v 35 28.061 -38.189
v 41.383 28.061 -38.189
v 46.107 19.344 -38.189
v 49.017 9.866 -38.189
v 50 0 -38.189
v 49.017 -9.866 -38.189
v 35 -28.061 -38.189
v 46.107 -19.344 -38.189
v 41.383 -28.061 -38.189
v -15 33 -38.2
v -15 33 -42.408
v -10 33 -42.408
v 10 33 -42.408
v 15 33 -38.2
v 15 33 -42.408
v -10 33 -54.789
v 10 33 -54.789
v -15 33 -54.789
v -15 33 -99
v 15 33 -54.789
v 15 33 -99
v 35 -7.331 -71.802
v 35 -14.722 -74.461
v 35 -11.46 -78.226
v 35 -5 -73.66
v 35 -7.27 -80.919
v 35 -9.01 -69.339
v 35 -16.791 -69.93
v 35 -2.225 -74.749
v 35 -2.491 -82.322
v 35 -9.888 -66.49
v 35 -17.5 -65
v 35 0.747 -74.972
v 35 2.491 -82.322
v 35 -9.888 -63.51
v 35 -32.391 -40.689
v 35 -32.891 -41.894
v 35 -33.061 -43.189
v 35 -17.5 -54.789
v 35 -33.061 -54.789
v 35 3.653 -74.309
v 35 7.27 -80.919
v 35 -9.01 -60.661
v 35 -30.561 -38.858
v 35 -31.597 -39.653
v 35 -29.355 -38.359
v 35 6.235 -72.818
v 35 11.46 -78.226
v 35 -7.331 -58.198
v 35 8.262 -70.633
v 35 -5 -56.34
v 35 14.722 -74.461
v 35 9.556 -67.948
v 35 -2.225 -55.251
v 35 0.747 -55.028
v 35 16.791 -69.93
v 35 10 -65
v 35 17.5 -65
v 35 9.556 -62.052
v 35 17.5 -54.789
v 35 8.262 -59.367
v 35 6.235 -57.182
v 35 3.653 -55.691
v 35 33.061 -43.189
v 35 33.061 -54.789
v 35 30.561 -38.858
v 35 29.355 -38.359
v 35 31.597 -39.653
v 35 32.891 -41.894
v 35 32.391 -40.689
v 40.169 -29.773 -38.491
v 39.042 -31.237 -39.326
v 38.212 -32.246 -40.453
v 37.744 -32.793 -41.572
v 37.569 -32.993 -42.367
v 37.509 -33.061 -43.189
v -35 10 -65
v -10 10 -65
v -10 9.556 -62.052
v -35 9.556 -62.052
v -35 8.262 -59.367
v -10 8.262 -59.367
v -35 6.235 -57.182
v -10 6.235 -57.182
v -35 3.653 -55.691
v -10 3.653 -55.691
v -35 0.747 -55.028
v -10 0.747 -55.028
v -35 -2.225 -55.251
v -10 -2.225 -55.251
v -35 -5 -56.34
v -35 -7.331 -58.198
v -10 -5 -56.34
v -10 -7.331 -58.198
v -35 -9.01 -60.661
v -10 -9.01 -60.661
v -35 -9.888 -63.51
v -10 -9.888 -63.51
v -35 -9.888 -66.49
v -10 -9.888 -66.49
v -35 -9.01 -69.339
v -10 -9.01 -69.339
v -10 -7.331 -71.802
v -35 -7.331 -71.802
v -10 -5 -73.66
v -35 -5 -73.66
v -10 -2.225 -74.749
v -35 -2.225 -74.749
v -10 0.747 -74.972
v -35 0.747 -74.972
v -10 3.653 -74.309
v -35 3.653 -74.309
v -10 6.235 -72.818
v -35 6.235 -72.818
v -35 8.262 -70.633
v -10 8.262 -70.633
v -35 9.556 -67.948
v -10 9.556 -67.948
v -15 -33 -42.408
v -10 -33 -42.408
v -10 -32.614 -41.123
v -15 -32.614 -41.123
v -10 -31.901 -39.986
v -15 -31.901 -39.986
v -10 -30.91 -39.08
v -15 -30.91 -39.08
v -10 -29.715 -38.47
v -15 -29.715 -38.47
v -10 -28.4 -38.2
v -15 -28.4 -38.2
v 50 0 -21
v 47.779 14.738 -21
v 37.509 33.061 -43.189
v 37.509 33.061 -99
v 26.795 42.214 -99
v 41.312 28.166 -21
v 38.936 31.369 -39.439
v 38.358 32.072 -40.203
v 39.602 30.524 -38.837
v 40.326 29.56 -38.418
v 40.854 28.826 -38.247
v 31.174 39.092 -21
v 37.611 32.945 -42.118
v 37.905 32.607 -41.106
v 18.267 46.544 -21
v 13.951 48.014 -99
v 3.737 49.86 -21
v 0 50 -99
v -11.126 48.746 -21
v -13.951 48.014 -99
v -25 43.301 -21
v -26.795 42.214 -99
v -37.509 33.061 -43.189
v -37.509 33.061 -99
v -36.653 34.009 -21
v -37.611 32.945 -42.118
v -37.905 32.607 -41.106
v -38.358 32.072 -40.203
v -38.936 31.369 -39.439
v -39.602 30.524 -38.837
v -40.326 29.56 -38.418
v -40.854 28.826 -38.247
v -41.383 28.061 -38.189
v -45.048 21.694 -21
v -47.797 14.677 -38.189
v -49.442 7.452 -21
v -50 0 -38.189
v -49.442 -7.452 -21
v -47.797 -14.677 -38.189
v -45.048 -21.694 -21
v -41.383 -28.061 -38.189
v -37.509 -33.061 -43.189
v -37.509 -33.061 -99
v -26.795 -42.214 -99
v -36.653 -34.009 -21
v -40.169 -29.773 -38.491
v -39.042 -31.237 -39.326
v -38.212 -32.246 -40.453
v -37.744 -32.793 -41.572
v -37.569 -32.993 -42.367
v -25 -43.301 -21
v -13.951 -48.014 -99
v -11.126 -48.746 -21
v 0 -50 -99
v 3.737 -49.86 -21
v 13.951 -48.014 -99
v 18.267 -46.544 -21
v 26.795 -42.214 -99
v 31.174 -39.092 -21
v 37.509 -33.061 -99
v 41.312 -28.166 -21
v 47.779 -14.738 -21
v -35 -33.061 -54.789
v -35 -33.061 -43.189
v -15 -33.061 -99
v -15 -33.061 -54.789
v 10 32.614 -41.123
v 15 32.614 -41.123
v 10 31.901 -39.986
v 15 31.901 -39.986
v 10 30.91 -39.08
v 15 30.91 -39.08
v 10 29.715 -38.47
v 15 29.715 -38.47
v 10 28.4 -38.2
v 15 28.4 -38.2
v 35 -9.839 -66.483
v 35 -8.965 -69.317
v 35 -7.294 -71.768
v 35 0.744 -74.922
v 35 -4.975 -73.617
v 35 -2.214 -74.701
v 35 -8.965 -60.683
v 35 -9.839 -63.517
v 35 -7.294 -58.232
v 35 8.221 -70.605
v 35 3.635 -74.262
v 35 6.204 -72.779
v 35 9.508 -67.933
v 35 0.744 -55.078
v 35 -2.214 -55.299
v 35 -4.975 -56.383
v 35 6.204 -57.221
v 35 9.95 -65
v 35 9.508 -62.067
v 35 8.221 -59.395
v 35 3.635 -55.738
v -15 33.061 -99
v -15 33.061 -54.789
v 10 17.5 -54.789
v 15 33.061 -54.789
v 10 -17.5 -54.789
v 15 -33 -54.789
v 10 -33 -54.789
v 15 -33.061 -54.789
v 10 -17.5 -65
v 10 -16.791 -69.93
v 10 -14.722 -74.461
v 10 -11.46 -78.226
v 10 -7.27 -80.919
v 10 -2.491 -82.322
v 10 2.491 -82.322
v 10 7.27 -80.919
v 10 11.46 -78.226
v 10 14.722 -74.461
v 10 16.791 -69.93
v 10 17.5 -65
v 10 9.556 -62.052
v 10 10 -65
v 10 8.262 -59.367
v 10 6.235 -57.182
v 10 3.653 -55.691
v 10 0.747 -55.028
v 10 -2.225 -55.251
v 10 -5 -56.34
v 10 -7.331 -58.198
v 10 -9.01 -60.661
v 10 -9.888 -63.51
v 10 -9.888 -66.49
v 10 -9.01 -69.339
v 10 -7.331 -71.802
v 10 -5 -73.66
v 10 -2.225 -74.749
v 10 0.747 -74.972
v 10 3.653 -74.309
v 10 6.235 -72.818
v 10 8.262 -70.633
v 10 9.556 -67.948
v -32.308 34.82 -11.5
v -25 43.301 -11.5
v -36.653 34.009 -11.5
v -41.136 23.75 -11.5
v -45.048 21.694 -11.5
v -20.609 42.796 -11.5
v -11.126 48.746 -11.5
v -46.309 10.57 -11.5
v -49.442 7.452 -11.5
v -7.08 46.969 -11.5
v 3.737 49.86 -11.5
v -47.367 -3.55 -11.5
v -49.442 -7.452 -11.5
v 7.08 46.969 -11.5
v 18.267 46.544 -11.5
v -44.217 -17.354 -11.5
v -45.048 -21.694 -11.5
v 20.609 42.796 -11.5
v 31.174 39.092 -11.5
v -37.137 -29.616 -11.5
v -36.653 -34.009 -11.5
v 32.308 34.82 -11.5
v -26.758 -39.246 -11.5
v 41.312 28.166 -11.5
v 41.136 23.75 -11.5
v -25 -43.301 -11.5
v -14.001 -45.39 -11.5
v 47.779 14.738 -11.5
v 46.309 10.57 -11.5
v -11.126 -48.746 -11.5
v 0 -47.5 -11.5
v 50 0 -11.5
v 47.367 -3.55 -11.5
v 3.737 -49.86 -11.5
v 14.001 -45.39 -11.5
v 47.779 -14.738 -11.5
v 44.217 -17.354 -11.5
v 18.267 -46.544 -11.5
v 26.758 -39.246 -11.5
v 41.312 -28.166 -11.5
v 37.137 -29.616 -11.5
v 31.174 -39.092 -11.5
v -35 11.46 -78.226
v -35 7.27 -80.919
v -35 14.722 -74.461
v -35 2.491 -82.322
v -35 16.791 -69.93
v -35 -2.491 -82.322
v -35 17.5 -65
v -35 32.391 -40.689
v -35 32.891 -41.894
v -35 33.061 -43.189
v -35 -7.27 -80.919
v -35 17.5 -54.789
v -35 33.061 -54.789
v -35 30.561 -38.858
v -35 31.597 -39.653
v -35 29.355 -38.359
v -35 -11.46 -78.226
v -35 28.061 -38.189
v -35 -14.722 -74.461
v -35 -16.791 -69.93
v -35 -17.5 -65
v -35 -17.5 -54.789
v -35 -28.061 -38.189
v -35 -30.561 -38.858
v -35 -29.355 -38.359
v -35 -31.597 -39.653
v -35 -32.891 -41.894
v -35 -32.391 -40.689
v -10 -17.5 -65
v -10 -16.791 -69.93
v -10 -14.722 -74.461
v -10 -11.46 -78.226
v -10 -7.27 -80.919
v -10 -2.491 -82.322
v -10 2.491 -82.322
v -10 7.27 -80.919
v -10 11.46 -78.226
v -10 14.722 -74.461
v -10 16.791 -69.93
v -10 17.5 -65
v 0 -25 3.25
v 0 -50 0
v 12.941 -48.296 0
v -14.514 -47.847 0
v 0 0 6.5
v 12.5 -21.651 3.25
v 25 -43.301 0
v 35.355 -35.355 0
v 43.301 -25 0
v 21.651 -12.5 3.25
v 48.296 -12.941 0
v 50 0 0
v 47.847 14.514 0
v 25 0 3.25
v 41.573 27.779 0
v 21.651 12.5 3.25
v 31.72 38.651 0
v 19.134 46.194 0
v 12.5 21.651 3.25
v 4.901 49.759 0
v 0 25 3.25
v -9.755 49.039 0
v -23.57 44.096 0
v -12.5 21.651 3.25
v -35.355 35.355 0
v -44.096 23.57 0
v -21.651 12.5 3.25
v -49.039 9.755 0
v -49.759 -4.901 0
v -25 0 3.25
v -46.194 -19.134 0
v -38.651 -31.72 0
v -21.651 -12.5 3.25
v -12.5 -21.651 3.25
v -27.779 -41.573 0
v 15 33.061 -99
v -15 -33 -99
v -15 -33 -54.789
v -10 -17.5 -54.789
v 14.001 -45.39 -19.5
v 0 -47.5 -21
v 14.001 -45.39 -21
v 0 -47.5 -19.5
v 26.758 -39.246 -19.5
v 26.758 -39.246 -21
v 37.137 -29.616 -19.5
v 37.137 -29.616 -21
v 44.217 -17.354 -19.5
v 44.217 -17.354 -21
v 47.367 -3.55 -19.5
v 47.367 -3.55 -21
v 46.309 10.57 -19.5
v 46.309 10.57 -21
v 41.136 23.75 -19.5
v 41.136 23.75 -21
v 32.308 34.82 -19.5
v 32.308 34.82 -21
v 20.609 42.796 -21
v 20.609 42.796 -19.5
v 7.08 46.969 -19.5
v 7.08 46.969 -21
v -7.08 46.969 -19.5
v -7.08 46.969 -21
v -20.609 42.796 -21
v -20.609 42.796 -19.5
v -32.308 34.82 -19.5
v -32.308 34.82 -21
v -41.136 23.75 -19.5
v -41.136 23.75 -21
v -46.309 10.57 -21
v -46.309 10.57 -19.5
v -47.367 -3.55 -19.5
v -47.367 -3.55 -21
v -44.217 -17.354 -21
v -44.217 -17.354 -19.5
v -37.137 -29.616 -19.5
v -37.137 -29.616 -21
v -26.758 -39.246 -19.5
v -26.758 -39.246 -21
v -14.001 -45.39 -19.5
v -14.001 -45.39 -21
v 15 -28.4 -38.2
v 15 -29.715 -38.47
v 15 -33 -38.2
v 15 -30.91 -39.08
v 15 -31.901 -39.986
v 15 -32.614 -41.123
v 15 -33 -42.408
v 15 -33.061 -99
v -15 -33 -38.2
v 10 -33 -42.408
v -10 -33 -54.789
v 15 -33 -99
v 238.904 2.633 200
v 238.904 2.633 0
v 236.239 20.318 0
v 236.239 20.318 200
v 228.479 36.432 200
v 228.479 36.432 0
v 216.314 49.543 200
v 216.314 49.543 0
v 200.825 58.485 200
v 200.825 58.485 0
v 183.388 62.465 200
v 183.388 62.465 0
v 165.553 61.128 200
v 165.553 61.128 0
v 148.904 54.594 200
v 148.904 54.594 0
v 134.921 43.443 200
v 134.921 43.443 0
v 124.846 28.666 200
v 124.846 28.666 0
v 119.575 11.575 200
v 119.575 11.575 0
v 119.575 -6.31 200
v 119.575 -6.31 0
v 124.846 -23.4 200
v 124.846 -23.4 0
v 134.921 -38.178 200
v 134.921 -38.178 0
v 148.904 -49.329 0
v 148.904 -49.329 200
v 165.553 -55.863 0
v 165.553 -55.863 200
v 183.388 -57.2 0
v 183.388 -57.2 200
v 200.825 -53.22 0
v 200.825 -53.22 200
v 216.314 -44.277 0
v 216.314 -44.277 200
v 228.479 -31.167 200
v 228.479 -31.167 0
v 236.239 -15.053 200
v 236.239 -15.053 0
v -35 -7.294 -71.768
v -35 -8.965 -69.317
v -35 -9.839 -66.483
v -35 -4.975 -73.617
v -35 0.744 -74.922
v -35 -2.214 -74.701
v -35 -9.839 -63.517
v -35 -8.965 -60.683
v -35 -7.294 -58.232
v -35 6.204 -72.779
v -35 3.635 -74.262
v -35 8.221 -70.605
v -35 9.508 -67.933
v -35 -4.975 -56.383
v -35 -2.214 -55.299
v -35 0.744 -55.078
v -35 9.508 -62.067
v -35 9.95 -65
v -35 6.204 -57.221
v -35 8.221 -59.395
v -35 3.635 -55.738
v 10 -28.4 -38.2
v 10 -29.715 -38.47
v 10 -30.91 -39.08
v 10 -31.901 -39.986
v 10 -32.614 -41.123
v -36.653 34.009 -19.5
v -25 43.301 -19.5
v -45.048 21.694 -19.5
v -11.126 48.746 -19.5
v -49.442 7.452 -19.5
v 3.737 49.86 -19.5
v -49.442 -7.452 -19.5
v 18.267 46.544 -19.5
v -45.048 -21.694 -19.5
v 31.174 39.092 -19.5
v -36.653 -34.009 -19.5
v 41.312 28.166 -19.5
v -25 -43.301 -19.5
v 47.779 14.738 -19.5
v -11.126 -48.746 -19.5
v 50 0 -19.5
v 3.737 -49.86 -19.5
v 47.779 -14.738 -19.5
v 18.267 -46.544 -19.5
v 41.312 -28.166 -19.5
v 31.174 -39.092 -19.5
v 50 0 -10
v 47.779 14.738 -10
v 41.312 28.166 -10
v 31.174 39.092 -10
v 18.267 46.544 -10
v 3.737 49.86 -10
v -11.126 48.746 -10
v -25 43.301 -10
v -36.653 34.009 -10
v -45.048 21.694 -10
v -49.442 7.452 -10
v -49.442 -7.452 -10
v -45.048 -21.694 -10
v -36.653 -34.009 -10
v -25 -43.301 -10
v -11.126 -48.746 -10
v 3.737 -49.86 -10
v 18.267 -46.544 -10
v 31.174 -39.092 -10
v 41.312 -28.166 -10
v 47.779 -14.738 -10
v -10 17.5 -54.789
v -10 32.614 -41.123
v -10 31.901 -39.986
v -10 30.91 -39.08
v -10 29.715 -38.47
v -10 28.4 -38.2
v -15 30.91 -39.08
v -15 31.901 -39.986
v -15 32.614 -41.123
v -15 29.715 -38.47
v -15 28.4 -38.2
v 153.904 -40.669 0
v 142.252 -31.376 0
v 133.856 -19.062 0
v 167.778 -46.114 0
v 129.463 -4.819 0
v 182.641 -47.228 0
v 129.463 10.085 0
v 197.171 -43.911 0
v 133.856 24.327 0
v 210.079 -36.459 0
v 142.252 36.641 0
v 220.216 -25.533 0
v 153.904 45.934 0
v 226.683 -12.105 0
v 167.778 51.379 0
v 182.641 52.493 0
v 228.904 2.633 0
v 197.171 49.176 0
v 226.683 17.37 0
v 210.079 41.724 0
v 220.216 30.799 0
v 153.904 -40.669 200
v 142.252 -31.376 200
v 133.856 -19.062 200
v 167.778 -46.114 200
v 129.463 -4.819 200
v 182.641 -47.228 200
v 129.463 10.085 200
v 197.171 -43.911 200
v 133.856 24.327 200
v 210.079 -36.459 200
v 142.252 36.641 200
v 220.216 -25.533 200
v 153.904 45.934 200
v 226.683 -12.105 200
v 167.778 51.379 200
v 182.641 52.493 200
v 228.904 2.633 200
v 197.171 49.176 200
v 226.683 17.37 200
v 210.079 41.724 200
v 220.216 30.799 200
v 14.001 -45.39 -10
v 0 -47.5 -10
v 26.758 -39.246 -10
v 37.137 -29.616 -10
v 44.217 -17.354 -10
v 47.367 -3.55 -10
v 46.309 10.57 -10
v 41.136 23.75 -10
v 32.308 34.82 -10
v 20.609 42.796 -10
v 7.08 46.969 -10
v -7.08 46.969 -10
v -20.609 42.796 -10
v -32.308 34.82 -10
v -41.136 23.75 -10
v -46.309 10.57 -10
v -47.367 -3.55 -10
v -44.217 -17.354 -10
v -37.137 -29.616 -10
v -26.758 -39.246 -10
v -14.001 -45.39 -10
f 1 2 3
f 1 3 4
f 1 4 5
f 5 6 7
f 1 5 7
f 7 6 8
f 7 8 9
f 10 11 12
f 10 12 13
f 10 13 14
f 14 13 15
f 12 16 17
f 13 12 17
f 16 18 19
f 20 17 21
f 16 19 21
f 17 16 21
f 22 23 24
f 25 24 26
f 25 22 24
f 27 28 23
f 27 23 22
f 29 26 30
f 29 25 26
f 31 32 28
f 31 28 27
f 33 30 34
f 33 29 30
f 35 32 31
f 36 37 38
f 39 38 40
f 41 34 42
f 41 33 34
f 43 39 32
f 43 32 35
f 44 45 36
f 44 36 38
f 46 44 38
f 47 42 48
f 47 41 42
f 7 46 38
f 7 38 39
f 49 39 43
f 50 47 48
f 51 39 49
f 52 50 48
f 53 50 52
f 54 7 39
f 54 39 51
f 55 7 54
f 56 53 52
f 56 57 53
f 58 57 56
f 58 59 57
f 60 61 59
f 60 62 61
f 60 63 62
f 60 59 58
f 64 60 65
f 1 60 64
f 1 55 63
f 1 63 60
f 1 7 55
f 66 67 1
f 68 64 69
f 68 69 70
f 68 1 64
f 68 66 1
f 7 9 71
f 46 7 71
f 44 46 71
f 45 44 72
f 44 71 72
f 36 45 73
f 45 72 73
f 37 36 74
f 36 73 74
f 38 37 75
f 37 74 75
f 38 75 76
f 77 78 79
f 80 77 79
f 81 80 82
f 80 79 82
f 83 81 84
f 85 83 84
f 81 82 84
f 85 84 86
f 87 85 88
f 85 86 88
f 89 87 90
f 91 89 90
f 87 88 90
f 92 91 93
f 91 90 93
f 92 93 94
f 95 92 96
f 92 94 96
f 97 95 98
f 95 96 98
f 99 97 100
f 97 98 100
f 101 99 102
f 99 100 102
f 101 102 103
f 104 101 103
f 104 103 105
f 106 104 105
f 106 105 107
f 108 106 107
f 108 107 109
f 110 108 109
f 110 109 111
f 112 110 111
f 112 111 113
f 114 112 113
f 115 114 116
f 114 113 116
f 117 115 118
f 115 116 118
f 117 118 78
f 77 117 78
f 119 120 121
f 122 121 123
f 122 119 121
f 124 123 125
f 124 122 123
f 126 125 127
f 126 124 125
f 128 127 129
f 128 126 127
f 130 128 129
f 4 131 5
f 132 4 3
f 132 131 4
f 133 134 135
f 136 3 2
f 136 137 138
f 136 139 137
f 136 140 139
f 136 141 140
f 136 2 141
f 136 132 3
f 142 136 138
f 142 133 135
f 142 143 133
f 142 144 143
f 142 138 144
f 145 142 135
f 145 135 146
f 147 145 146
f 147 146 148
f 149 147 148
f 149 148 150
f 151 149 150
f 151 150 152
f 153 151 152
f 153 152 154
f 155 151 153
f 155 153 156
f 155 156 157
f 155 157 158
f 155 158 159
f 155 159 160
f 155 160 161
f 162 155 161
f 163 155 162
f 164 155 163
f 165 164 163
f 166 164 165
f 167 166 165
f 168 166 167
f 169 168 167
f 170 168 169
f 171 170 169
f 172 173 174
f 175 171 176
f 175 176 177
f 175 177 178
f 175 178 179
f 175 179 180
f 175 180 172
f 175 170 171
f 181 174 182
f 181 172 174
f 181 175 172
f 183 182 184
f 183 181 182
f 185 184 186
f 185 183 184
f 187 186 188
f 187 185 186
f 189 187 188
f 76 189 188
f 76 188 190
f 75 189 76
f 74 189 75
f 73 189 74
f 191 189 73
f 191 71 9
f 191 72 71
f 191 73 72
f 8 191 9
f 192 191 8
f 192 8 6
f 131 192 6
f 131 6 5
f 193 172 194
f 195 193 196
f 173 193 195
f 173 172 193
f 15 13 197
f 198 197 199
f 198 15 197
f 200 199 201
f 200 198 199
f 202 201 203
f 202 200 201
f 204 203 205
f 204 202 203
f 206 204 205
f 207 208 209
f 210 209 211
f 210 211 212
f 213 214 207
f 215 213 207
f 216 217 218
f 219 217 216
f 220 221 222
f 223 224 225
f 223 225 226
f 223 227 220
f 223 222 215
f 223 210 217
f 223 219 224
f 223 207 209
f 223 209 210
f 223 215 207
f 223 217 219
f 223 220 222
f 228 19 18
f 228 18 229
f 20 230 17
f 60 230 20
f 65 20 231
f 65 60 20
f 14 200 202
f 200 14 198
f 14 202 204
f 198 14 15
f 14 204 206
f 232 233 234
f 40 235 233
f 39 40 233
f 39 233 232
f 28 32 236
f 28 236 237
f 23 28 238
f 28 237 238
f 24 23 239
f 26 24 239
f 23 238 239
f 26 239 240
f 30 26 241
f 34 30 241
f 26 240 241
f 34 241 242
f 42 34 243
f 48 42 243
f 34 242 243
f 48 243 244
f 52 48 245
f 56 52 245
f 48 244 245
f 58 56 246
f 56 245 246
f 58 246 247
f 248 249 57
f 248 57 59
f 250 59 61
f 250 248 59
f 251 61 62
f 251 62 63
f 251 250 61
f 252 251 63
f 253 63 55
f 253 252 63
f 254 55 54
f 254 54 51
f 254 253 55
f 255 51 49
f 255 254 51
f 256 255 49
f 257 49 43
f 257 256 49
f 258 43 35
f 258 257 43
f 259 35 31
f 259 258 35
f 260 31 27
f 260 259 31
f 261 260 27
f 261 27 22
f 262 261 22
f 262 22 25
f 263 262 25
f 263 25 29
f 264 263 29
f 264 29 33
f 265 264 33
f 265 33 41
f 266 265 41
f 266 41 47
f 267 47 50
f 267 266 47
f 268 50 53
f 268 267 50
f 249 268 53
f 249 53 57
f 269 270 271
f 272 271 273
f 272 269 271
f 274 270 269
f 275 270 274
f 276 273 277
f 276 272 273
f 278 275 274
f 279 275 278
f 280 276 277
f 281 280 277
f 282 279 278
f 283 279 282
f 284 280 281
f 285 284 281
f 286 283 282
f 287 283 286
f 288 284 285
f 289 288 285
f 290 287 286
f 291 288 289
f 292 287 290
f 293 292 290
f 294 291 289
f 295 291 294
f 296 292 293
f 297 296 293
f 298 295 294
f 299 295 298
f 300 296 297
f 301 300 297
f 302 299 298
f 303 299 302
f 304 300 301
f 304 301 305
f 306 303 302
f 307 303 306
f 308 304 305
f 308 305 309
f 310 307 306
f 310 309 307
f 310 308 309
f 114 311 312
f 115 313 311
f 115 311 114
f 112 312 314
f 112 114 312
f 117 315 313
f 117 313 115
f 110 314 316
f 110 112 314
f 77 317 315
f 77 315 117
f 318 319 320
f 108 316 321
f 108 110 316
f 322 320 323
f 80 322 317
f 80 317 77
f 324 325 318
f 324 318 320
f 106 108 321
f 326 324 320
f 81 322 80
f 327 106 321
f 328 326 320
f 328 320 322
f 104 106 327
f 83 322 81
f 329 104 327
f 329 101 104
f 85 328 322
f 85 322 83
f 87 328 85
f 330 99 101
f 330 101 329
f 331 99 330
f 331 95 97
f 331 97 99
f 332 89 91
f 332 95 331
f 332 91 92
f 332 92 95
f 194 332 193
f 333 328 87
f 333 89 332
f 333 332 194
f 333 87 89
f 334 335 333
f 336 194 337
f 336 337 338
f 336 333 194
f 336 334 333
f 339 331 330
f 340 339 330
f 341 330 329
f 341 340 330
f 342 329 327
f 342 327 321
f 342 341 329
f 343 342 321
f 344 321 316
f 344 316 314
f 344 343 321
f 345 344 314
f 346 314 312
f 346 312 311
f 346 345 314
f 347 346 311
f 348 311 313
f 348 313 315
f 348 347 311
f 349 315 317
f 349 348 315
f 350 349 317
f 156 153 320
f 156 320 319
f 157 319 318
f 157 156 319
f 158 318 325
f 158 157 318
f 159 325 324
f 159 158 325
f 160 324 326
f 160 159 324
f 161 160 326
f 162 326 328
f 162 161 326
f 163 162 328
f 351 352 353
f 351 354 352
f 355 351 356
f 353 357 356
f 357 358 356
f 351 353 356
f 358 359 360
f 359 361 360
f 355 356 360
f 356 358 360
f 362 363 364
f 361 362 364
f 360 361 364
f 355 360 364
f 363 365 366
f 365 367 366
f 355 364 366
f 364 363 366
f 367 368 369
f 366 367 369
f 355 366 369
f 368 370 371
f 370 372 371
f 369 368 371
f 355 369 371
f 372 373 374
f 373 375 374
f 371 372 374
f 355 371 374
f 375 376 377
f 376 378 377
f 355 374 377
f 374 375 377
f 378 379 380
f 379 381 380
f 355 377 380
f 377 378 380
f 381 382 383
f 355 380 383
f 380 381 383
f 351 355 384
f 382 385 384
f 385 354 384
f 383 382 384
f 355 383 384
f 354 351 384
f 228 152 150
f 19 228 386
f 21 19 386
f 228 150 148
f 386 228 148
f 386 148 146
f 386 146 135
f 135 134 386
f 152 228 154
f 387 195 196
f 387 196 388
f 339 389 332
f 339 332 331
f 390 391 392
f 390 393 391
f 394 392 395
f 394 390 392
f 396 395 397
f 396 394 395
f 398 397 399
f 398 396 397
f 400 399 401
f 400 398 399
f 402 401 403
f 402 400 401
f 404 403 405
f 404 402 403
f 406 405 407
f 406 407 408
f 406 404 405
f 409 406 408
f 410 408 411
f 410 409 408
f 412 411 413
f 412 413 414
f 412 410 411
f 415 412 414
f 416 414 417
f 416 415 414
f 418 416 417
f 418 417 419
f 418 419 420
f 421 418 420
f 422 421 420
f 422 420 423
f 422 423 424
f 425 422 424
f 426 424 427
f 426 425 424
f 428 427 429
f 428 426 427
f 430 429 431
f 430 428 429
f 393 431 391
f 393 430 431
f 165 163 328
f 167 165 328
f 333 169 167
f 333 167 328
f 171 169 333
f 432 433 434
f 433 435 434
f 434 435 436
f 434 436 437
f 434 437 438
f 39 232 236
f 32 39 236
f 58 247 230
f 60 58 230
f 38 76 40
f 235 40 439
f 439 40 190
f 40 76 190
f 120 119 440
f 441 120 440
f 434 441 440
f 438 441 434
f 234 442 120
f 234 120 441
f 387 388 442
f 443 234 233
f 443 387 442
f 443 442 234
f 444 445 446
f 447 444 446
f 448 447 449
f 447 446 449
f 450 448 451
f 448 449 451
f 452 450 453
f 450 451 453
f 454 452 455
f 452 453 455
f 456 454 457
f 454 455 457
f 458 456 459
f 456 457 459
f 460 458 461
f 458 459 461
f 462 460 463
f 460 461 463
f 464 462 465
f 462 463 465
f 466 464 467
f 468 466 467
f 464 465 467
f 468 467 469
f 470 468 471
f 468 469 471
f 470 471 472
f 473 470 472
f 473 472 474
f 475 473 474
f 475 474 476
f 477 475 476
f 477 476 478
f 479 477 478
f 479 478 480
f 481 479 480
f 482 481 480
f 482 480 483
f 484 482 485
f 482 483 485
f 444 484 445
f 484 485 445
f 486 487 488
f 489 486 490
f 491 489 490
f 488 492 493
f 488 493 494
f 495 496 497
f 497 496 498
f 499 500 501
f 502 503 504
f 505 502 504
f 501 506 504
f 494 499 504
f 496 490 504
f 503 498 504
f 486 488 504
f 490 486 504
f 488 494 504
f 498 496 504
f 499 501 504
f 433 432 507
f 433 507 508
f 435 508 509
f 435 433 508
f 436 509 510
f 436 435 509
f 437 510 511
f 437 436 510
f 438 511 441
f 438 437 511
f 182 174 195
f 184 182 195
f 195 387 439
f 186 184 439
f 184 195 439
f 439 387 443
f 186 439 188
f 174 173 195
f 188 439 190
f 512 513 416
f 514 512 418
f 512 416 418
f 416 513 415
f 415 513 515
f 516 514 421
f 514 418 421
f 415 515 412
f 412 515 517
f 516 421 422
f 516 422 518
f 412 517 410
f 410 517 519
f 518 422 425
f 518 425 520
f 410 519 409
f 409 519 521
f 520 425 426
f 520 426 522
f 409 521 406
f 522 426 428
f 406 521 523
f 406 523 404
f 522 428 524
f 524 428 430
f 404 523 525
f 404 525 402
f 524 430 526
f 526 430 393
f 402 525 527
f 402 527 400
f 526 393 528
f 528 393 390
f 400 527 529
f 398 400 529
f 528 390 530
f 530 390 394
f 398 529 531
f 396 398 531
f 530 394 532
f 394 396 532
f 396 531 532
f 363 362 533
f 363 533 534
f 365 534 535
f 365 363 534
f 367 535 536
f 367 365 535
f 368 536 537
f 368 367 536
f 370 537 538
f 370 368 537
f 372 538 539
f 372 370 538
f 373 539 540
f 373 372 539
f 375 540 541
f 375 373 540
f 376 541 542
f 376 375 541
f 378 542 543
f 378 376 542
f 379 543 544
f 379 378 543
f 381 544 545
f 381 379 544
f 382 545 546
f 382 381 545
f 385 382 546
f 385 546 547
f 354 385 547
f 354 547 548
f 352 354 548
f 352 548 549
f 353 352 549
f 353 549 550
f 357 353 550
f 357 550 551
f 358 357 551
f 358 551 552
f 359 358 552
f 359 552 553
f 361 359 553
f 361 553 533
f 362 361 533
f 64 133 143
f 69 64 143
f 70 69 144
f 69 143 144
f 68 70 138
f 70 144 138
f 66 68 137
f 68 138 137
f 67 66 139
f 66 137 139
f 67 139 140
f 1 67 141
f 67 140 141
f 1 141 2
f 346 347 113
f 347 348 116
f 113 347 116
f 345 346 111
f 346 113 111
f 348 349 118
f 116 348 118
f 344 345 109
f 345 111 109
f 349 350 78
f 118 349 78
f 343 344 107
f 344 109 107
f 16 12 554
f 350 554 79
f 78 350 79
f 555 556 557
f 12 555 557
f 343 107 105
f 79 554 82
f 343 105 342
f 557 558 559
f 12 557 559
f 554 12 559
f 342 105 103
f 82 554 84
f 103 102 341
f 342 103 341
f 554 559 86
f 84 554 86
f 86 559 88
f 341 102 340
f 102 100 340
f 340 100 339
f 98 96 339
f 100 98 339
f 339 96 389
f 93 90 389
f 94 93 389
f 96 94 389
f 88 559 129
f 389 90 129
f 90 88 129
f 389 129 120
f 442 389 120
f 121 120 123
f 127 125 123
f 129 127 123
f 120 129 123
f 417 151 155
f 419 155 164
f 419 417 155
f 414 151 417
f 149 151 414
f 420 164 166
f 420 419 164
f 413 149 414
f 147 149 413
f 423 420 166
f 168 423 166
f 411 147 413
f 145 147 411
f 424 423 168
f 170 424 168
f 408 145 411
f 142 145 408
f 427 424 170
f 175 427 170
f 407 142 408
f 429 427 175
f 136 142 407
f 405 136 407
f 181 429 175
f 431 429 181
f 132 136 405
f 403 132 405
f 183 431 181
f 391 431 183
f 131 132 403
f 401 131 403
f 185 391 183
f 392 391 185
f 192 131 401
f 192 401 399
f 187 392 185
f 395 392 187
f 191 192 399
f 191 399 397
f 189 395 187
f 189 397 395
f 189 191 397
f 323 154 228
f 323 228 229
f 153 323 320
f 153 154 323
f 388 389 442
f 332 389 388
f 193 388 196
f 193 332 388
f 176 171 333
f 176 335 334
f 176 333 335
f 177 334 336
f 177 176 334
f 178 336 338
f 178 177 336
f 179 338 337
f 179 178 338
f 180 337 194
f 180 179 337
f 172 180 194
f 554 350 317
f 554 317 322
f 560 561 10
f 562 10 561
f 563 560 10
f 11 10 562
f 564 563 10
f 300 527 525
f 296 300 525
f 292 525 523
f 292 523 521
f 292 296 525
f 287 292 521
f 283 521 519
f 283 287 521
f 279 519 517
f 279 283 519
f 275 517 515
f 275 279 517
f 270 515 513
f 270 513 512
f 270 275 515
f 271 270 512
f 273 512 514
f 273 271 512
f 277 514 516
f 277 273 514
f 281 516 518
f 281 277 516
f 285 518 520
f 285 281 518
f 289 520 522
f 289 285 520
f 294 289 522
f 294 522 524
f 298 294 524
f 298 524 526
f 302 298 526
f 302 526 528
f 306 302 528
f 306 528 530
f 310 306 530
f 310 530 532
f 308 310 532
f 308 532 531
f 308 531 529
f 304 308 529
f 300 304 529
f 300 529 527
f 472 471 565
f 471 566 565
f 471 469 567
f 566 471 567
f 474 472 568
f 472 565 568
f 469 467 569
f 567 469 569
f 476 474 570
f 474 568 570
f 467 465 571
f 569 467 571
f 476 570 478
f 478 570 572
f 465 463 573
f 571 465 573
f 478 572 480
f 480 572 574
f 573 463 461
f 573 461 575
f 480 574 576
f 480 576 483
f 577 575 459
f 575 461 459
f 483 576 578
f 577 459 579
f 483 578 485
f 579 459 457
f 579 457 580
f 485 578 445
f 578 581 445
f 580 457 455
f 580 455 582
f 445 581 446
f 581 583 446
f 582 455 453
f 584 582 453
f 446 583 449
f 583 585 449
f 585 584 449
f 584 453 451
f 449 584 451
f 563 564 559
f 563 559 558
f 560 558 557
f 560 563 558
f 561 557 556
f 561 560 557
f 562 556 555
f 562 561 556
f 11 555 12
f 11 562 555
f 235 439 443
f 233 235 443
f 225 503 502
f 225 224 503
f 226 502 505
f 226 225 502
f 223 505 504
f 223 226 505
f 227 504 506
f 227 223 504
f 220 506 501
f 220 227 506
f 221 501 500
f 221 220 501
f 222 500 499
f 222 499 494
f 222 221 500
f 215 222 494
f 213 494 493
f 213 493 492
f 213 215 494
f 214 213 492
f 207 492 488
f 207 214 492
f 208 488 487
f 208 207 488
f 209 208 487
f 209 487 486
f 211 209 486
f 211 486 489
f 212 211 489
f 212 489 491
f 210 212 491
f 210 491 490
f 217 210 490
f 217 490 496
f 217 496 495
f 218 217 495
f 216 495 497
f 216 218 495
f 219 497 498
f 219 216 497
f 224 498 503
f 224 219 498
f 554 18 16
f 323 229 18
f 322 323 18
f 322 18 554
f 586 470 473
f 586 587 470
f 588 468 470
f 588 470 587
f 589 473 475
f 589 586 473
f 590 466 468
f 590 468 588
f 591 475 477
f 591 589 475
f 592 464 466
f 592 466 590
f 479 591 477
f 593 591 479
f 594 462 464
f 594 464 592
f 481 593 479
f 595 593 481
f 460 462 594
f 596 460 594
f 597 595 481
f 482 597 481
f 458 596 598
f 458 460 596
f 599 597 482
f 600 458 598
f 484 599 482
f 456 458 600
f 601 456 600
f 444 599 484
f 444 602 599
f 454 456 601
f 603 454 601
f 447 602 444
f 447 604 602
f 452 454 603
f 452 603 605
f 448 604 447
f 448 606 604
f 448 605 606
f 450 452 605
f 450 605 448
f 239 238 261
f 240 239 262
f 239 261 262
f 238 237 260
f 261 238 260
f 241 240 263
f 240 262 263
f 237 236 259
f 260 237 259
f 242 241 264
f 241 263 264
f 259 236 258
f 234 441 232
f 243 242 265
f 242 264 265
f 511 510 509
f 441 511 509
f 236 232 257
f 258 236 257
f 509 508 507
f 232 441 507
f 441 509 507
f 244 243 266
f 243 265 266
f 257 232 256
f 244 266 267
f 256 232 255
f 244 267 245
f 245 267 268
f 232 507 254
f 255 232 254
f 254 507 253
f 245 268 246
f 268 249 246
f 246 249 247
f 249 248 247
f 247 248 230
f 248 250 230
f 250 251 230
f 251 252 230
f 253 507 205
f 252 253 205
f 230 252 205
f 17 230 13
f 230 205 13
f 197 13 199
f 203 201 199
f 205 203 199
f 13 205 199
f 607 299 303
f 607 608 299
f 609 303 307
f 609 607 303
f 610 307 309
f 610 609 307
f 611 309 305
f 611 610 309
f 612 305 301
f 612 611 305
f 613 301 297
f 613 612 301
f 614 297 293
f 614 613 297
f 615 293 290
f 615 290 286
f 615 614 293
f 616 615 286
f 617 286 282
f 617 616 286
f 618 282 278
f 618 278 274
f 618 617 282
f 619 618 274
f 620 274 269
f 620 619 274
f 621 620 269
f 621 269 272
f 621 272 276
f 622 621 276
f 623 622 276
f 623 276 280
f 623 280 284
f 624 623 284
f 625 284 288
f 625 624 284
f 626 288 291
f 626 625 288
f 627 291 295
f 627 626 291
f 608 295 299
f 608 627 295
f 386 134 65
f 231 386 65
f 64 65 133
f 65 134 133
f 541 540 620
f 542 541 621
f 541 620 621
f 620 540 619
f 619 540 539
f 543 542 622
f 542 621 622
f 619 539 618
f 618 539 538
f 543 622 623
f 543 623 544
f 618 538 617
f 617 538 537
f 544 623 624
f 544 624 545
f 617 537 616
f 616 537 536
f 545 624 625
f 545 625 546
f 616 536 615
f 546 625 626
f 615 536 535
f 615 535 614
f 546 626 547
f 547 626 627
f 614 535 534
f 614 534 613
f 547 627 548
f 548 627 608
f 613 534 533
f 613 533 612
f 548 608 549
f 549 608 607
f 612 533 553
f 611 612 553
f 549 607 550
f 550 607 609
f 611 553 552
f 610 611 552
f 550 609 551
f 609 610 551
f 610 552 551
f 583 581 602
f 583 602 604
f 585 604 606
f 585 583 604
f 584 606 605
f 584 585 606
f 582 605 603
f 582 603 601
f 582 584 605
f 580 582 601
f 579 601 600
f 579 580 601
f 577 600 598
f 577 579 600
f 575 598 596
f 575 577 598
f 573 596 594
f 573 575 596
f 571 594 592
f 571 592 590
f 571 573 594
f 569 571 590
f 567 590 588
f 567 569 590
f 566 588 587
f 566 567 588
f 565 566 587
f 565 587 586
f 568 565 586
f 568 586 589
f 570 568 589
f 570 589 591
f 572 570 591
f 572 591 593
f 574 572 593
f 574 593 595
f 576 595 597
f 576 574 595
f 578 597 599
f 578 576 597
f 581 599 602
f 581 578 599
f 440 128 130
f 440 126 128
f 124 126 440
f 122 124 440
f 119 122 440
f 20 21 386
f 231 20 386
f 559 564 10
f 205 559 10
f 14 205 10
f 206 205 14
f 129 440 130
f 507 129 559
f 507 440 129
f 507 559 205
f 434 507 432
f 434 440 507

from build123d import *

# Parameters (mm, degrees)
F0_R      = 50
F3_DEPTH  = 99
F4_W      = 2.5
F4_H      = 1.5
F10_DEPTH = 35
F12_DEPTH = 35
F5_R      = 10
F13_DEPTH = 19.8
F15_W     = 30
F15_H     = 66
F16_DEPTH = 60.8
F17_DEPTH = 60
F20_R     = 10
F22_DEPTH = 25
F21_R     = 10
F23_DEPTH = 25
F27_DEPTH = 25
F28_DEPTH = 25
F29_R     = 9.95
F30_DEPTH = 35
F31_R     = 60
F32_DEPTH = 250
F33_R     = 50
F34_DEPTH = 250
F36_R     = 60
F36_R_2   = 50
F37_DEPTH = 200


with BuildPart() as f2:
    # F1 (on Right) → F2 (revolve)
    with BuildSketch(Plane.YZ):
        Polygon((-50, 0), (0, 0), (0, 6.5), align=None)
    revolve(axis=Axis((0, 0, 3.25), (0, 0, 1)))

    # F15 (on face) → F17 (cut)
    with BuildSketch(Plane(origin=(0, 0, -99), x_dir=(1, 0, 0), z_dir=(0, 0, -1))):
        Rectangle(F15_W, F15_H)
    extrude(amount=-F17_DEPTH, mode=Mode.SUBTRACT)



with BuildPart() as f3:
    # F0 (on Top) → F3 (new body)
    with BuildSketch(Plane.XY):
        Circle(F0_R)
    extrude(amount=-F3_DEPTH)

    # F4 (on Right) → F6 (revolve, cut)
    with BuildSketch(Plane.YZ):
        with Locations((-48.75, -10.75)):
            Rectangle(F4_W, F4_H)
        with Locations((-48.75, -20.25)):
            Rectangle(F4_W, F4_H)
    revolve(axis=Axis((0, 0, 0), (0, 0, 1)), mode=Mode.SUBTRACT)

    # F9 (on offset) → F10 (cut)
    with BuildSketch(Plane.YZ.offset(50)):
        with BuildLine():
            Line((-33.0612659454, -43.1885213554), (-33.0612659454, -99))
            Line((-33.0612659454, -99), (33.0612659454, -99))
            Line((33.0612659454, -99), (33.0612659454, -43.1885213554))
            ThreePointArc((33.0612659454, -43.1885213554), (31.5967998514, -39.6529874495), (28.0612659454, -38.1885213554))
            Line((28.0612659454, -38.1885213554), (-28.0612659454, -38.1885213554))
            ThreePointArc((-28.0612659454, -38.1885213554), (-31.5967998514, -39.6529874495), (-33.0612659454, -43.1885213554))
        make_face()
    extrude(amount=-F10_DEPTH, mode=Mode.SUBTRACT)

    # F11 (on offset) → F12 (cut)
    with BuildSketch(Plane.YZ.offset(-50)):
        with BuildLine():
            Line((28.0612659454, -38.1885213554), (-28.0612659454, -38.1885213554))
            ThreePointArc((-28.0612659454, -38.1885213554), (-31.5967998514, -39.6529874495), (-33.0612659454, -43.1885213554))
            Line((-33.0612659454, -43.1885213554), (-33.0612659454, -99))
            Line((-33.0612659454, -99), (33.0612659454, -99))
            Line((33.0612659454, -99), (33.0612659454, -43.1885213554))
            ThreePointArc((33.0612659454, -43.1885213554), (31.5967998514, -39.6529874495), (28.0612659454, -38.1885213554))
        make_face()
    extrude(amount=F12_DEPTH, mode=Mode.SUBTRACT)


with BuildPart() as f13:
    # F5 (on Right) → F13 (new body, symmetric)
    with BuildSketch(Plane.YZ):
        with Locations((0, -57.3838736531)):
            Circle(F5_R)
    extrude(amount=F13_DEPTH, both=True)


with BuildPart() as f3_1:
    add(f3.part)

    # F14: cut F13
    add(f13.part, mode=Mode.SUBTRACT)

    # F15 (on face) → F16 (cut)
    with BuildSketch(Plane(origin=(0, 0, -99), x_dir=(1, 0, 0), z_dir=(0, 0, -1))):
        Rectangle(F15_W, F15_H)
    extrude(amount=-F16_DEPTH, mode=Mode.SUBTRACT)

    # F20 (on offset) → F22 (join)
    with BuildSketch(Plane.YZ.offset(10)):
        with BuildLine():
            Line((-17.5, -38.2), (-17.5, -65))
            ThreePointArc((-17.5, -65), (0, -82.5), (17.5, -65))
            Line((17.5, -65), (17.5, -38.2))
            Line((17.5, -38.2), (-17.5, -38.2))
        make_face()
        with Locations((0, -65)):
            Circle(F20_R, mode=Mode.SUBTRACT)
    extrude(amount=F22_DEPTH)

    # F21 (on offset) → F23 (join)
    with BuildSketch(Plane.YZ.offset(-10)):
        with BuildLine():
            Line((-17.5, -38.2), (-17.5, -65))
            ThreePointArc((-17.5, -65), (0, -82.5), (17.5, -65))
            Line((17.5, -65), (17.5, -38.2))
            Line((17.5, -38.2), (-17.5, -38.2))
        make_face()
        with Locations((0, -65)):
            Circle(F21_R, mode=Mode.SUBTRACT)
    extrude(amount=-F23_DEPTH)

    # F24 (on face) → F27 (join)
    with BuildSketch(Plane(origin=(-35, 0, 0), x_dir=(0, -1, 0), z_dir=(-1, 0, 0))):
        with BuildLine():
            Line((28.0612659454, -38.1885213554), (-28.0612659454, -38.1885213554))
            ThreePointArc((-28.0612659454, -38.1885213554), (-31.5967998514, -39.6529874495), (-33.0612659454, -43.1885213554))
            Line((-33.0612659454, -43.1885213554), (-33.0612659454, -54.7885213554))
            Line((-33.0612659454, -54.7885213554), (33.0612659454, -54.7885213554))
            Line((33.0612659454, -54.7885213554), (33.0612659454, -43.1885213554))
            ThreePointArc((33.0612659454, -43.1885213554), (31.5967998514, -39.6529874495), (28.0612659454, -38.1885213554))
        make_face()
    extrude(amount=-F27_DEPTH)


with BuildPart() as f2_1:
    add(f2.part)

    add(f3_1.part)  # F28 merges F3
    # F26 (on offset) → F28 (join)
    with BuildSketch(Plane.YZ.offset(35)):
        with BuildLine():
            Line((28.0612659454, -38.1885213554), (-28.0612659454, -38.1885213554))
            ThreePointArc((-28.0612659454, -38.1885213554), (-31.5967998514, -39.6529874495), (-33.0612659454, -43.1885213554))
            Line((-33.0612659454, -43.1885213554), (-33.0612659454, -54.7885213554))
            Line((-33.0612659454, -54.7885213554), (33.0612659454, -54.7885213554))
            Line((33.0612659454, -54.7885213554), (33.0612659454, -43.1885213554))
            ThreePointArc((33.0612659454, -43.1885213554), (31.5967998514, -39.6529874495), (28.0612659454, -38.1885213554))
        make_face()
    extrude(amount=-F28_DEPTH)


with BuildPart() as f30:
    # F29 (on Right) → F30 (new body, symmetric)
    with BuildSketch(Plane.YZ):
        with Locations((0, -65)):
            Circle(F29_R)
    extrude(amount=F30_DEPTH, both=True)


with BuildPart() as f32:
    # F31 (on Top) → F32 (new body)
    with BuildSketch(Plane.XY):
        with Locations((170.8920747042, -5.8375727385)):
            Circle(F31_R)
    extrude(amount=F32_DEPTH)

    # F33 (on face) → F34 (cut)
    with BuildSketch(Plane.XY.offset(250)):
        with Locations((170.8920747042, -5.8375727385)):
            Circle(F33_R)
    extrude(amount=-F34_DEPTH, mode=Mode.SUBTRACT)


with BuildPart() as f37:
    # F36 (on Top) → F37 (new body)
    with BuildSketch(Plane.XY):
        with Locations((178.9044439793, 2.6326305233)):
            Circle(F36_R)
        with Locations((178.9044439793, 2.6326305233)):
            Circle(F36_R_2, mode=Mode.SUBTRACT)
    extrude(amount=F37_DEPTH)


solid = Compound([f2_1.part, f30.part, f37.part])
